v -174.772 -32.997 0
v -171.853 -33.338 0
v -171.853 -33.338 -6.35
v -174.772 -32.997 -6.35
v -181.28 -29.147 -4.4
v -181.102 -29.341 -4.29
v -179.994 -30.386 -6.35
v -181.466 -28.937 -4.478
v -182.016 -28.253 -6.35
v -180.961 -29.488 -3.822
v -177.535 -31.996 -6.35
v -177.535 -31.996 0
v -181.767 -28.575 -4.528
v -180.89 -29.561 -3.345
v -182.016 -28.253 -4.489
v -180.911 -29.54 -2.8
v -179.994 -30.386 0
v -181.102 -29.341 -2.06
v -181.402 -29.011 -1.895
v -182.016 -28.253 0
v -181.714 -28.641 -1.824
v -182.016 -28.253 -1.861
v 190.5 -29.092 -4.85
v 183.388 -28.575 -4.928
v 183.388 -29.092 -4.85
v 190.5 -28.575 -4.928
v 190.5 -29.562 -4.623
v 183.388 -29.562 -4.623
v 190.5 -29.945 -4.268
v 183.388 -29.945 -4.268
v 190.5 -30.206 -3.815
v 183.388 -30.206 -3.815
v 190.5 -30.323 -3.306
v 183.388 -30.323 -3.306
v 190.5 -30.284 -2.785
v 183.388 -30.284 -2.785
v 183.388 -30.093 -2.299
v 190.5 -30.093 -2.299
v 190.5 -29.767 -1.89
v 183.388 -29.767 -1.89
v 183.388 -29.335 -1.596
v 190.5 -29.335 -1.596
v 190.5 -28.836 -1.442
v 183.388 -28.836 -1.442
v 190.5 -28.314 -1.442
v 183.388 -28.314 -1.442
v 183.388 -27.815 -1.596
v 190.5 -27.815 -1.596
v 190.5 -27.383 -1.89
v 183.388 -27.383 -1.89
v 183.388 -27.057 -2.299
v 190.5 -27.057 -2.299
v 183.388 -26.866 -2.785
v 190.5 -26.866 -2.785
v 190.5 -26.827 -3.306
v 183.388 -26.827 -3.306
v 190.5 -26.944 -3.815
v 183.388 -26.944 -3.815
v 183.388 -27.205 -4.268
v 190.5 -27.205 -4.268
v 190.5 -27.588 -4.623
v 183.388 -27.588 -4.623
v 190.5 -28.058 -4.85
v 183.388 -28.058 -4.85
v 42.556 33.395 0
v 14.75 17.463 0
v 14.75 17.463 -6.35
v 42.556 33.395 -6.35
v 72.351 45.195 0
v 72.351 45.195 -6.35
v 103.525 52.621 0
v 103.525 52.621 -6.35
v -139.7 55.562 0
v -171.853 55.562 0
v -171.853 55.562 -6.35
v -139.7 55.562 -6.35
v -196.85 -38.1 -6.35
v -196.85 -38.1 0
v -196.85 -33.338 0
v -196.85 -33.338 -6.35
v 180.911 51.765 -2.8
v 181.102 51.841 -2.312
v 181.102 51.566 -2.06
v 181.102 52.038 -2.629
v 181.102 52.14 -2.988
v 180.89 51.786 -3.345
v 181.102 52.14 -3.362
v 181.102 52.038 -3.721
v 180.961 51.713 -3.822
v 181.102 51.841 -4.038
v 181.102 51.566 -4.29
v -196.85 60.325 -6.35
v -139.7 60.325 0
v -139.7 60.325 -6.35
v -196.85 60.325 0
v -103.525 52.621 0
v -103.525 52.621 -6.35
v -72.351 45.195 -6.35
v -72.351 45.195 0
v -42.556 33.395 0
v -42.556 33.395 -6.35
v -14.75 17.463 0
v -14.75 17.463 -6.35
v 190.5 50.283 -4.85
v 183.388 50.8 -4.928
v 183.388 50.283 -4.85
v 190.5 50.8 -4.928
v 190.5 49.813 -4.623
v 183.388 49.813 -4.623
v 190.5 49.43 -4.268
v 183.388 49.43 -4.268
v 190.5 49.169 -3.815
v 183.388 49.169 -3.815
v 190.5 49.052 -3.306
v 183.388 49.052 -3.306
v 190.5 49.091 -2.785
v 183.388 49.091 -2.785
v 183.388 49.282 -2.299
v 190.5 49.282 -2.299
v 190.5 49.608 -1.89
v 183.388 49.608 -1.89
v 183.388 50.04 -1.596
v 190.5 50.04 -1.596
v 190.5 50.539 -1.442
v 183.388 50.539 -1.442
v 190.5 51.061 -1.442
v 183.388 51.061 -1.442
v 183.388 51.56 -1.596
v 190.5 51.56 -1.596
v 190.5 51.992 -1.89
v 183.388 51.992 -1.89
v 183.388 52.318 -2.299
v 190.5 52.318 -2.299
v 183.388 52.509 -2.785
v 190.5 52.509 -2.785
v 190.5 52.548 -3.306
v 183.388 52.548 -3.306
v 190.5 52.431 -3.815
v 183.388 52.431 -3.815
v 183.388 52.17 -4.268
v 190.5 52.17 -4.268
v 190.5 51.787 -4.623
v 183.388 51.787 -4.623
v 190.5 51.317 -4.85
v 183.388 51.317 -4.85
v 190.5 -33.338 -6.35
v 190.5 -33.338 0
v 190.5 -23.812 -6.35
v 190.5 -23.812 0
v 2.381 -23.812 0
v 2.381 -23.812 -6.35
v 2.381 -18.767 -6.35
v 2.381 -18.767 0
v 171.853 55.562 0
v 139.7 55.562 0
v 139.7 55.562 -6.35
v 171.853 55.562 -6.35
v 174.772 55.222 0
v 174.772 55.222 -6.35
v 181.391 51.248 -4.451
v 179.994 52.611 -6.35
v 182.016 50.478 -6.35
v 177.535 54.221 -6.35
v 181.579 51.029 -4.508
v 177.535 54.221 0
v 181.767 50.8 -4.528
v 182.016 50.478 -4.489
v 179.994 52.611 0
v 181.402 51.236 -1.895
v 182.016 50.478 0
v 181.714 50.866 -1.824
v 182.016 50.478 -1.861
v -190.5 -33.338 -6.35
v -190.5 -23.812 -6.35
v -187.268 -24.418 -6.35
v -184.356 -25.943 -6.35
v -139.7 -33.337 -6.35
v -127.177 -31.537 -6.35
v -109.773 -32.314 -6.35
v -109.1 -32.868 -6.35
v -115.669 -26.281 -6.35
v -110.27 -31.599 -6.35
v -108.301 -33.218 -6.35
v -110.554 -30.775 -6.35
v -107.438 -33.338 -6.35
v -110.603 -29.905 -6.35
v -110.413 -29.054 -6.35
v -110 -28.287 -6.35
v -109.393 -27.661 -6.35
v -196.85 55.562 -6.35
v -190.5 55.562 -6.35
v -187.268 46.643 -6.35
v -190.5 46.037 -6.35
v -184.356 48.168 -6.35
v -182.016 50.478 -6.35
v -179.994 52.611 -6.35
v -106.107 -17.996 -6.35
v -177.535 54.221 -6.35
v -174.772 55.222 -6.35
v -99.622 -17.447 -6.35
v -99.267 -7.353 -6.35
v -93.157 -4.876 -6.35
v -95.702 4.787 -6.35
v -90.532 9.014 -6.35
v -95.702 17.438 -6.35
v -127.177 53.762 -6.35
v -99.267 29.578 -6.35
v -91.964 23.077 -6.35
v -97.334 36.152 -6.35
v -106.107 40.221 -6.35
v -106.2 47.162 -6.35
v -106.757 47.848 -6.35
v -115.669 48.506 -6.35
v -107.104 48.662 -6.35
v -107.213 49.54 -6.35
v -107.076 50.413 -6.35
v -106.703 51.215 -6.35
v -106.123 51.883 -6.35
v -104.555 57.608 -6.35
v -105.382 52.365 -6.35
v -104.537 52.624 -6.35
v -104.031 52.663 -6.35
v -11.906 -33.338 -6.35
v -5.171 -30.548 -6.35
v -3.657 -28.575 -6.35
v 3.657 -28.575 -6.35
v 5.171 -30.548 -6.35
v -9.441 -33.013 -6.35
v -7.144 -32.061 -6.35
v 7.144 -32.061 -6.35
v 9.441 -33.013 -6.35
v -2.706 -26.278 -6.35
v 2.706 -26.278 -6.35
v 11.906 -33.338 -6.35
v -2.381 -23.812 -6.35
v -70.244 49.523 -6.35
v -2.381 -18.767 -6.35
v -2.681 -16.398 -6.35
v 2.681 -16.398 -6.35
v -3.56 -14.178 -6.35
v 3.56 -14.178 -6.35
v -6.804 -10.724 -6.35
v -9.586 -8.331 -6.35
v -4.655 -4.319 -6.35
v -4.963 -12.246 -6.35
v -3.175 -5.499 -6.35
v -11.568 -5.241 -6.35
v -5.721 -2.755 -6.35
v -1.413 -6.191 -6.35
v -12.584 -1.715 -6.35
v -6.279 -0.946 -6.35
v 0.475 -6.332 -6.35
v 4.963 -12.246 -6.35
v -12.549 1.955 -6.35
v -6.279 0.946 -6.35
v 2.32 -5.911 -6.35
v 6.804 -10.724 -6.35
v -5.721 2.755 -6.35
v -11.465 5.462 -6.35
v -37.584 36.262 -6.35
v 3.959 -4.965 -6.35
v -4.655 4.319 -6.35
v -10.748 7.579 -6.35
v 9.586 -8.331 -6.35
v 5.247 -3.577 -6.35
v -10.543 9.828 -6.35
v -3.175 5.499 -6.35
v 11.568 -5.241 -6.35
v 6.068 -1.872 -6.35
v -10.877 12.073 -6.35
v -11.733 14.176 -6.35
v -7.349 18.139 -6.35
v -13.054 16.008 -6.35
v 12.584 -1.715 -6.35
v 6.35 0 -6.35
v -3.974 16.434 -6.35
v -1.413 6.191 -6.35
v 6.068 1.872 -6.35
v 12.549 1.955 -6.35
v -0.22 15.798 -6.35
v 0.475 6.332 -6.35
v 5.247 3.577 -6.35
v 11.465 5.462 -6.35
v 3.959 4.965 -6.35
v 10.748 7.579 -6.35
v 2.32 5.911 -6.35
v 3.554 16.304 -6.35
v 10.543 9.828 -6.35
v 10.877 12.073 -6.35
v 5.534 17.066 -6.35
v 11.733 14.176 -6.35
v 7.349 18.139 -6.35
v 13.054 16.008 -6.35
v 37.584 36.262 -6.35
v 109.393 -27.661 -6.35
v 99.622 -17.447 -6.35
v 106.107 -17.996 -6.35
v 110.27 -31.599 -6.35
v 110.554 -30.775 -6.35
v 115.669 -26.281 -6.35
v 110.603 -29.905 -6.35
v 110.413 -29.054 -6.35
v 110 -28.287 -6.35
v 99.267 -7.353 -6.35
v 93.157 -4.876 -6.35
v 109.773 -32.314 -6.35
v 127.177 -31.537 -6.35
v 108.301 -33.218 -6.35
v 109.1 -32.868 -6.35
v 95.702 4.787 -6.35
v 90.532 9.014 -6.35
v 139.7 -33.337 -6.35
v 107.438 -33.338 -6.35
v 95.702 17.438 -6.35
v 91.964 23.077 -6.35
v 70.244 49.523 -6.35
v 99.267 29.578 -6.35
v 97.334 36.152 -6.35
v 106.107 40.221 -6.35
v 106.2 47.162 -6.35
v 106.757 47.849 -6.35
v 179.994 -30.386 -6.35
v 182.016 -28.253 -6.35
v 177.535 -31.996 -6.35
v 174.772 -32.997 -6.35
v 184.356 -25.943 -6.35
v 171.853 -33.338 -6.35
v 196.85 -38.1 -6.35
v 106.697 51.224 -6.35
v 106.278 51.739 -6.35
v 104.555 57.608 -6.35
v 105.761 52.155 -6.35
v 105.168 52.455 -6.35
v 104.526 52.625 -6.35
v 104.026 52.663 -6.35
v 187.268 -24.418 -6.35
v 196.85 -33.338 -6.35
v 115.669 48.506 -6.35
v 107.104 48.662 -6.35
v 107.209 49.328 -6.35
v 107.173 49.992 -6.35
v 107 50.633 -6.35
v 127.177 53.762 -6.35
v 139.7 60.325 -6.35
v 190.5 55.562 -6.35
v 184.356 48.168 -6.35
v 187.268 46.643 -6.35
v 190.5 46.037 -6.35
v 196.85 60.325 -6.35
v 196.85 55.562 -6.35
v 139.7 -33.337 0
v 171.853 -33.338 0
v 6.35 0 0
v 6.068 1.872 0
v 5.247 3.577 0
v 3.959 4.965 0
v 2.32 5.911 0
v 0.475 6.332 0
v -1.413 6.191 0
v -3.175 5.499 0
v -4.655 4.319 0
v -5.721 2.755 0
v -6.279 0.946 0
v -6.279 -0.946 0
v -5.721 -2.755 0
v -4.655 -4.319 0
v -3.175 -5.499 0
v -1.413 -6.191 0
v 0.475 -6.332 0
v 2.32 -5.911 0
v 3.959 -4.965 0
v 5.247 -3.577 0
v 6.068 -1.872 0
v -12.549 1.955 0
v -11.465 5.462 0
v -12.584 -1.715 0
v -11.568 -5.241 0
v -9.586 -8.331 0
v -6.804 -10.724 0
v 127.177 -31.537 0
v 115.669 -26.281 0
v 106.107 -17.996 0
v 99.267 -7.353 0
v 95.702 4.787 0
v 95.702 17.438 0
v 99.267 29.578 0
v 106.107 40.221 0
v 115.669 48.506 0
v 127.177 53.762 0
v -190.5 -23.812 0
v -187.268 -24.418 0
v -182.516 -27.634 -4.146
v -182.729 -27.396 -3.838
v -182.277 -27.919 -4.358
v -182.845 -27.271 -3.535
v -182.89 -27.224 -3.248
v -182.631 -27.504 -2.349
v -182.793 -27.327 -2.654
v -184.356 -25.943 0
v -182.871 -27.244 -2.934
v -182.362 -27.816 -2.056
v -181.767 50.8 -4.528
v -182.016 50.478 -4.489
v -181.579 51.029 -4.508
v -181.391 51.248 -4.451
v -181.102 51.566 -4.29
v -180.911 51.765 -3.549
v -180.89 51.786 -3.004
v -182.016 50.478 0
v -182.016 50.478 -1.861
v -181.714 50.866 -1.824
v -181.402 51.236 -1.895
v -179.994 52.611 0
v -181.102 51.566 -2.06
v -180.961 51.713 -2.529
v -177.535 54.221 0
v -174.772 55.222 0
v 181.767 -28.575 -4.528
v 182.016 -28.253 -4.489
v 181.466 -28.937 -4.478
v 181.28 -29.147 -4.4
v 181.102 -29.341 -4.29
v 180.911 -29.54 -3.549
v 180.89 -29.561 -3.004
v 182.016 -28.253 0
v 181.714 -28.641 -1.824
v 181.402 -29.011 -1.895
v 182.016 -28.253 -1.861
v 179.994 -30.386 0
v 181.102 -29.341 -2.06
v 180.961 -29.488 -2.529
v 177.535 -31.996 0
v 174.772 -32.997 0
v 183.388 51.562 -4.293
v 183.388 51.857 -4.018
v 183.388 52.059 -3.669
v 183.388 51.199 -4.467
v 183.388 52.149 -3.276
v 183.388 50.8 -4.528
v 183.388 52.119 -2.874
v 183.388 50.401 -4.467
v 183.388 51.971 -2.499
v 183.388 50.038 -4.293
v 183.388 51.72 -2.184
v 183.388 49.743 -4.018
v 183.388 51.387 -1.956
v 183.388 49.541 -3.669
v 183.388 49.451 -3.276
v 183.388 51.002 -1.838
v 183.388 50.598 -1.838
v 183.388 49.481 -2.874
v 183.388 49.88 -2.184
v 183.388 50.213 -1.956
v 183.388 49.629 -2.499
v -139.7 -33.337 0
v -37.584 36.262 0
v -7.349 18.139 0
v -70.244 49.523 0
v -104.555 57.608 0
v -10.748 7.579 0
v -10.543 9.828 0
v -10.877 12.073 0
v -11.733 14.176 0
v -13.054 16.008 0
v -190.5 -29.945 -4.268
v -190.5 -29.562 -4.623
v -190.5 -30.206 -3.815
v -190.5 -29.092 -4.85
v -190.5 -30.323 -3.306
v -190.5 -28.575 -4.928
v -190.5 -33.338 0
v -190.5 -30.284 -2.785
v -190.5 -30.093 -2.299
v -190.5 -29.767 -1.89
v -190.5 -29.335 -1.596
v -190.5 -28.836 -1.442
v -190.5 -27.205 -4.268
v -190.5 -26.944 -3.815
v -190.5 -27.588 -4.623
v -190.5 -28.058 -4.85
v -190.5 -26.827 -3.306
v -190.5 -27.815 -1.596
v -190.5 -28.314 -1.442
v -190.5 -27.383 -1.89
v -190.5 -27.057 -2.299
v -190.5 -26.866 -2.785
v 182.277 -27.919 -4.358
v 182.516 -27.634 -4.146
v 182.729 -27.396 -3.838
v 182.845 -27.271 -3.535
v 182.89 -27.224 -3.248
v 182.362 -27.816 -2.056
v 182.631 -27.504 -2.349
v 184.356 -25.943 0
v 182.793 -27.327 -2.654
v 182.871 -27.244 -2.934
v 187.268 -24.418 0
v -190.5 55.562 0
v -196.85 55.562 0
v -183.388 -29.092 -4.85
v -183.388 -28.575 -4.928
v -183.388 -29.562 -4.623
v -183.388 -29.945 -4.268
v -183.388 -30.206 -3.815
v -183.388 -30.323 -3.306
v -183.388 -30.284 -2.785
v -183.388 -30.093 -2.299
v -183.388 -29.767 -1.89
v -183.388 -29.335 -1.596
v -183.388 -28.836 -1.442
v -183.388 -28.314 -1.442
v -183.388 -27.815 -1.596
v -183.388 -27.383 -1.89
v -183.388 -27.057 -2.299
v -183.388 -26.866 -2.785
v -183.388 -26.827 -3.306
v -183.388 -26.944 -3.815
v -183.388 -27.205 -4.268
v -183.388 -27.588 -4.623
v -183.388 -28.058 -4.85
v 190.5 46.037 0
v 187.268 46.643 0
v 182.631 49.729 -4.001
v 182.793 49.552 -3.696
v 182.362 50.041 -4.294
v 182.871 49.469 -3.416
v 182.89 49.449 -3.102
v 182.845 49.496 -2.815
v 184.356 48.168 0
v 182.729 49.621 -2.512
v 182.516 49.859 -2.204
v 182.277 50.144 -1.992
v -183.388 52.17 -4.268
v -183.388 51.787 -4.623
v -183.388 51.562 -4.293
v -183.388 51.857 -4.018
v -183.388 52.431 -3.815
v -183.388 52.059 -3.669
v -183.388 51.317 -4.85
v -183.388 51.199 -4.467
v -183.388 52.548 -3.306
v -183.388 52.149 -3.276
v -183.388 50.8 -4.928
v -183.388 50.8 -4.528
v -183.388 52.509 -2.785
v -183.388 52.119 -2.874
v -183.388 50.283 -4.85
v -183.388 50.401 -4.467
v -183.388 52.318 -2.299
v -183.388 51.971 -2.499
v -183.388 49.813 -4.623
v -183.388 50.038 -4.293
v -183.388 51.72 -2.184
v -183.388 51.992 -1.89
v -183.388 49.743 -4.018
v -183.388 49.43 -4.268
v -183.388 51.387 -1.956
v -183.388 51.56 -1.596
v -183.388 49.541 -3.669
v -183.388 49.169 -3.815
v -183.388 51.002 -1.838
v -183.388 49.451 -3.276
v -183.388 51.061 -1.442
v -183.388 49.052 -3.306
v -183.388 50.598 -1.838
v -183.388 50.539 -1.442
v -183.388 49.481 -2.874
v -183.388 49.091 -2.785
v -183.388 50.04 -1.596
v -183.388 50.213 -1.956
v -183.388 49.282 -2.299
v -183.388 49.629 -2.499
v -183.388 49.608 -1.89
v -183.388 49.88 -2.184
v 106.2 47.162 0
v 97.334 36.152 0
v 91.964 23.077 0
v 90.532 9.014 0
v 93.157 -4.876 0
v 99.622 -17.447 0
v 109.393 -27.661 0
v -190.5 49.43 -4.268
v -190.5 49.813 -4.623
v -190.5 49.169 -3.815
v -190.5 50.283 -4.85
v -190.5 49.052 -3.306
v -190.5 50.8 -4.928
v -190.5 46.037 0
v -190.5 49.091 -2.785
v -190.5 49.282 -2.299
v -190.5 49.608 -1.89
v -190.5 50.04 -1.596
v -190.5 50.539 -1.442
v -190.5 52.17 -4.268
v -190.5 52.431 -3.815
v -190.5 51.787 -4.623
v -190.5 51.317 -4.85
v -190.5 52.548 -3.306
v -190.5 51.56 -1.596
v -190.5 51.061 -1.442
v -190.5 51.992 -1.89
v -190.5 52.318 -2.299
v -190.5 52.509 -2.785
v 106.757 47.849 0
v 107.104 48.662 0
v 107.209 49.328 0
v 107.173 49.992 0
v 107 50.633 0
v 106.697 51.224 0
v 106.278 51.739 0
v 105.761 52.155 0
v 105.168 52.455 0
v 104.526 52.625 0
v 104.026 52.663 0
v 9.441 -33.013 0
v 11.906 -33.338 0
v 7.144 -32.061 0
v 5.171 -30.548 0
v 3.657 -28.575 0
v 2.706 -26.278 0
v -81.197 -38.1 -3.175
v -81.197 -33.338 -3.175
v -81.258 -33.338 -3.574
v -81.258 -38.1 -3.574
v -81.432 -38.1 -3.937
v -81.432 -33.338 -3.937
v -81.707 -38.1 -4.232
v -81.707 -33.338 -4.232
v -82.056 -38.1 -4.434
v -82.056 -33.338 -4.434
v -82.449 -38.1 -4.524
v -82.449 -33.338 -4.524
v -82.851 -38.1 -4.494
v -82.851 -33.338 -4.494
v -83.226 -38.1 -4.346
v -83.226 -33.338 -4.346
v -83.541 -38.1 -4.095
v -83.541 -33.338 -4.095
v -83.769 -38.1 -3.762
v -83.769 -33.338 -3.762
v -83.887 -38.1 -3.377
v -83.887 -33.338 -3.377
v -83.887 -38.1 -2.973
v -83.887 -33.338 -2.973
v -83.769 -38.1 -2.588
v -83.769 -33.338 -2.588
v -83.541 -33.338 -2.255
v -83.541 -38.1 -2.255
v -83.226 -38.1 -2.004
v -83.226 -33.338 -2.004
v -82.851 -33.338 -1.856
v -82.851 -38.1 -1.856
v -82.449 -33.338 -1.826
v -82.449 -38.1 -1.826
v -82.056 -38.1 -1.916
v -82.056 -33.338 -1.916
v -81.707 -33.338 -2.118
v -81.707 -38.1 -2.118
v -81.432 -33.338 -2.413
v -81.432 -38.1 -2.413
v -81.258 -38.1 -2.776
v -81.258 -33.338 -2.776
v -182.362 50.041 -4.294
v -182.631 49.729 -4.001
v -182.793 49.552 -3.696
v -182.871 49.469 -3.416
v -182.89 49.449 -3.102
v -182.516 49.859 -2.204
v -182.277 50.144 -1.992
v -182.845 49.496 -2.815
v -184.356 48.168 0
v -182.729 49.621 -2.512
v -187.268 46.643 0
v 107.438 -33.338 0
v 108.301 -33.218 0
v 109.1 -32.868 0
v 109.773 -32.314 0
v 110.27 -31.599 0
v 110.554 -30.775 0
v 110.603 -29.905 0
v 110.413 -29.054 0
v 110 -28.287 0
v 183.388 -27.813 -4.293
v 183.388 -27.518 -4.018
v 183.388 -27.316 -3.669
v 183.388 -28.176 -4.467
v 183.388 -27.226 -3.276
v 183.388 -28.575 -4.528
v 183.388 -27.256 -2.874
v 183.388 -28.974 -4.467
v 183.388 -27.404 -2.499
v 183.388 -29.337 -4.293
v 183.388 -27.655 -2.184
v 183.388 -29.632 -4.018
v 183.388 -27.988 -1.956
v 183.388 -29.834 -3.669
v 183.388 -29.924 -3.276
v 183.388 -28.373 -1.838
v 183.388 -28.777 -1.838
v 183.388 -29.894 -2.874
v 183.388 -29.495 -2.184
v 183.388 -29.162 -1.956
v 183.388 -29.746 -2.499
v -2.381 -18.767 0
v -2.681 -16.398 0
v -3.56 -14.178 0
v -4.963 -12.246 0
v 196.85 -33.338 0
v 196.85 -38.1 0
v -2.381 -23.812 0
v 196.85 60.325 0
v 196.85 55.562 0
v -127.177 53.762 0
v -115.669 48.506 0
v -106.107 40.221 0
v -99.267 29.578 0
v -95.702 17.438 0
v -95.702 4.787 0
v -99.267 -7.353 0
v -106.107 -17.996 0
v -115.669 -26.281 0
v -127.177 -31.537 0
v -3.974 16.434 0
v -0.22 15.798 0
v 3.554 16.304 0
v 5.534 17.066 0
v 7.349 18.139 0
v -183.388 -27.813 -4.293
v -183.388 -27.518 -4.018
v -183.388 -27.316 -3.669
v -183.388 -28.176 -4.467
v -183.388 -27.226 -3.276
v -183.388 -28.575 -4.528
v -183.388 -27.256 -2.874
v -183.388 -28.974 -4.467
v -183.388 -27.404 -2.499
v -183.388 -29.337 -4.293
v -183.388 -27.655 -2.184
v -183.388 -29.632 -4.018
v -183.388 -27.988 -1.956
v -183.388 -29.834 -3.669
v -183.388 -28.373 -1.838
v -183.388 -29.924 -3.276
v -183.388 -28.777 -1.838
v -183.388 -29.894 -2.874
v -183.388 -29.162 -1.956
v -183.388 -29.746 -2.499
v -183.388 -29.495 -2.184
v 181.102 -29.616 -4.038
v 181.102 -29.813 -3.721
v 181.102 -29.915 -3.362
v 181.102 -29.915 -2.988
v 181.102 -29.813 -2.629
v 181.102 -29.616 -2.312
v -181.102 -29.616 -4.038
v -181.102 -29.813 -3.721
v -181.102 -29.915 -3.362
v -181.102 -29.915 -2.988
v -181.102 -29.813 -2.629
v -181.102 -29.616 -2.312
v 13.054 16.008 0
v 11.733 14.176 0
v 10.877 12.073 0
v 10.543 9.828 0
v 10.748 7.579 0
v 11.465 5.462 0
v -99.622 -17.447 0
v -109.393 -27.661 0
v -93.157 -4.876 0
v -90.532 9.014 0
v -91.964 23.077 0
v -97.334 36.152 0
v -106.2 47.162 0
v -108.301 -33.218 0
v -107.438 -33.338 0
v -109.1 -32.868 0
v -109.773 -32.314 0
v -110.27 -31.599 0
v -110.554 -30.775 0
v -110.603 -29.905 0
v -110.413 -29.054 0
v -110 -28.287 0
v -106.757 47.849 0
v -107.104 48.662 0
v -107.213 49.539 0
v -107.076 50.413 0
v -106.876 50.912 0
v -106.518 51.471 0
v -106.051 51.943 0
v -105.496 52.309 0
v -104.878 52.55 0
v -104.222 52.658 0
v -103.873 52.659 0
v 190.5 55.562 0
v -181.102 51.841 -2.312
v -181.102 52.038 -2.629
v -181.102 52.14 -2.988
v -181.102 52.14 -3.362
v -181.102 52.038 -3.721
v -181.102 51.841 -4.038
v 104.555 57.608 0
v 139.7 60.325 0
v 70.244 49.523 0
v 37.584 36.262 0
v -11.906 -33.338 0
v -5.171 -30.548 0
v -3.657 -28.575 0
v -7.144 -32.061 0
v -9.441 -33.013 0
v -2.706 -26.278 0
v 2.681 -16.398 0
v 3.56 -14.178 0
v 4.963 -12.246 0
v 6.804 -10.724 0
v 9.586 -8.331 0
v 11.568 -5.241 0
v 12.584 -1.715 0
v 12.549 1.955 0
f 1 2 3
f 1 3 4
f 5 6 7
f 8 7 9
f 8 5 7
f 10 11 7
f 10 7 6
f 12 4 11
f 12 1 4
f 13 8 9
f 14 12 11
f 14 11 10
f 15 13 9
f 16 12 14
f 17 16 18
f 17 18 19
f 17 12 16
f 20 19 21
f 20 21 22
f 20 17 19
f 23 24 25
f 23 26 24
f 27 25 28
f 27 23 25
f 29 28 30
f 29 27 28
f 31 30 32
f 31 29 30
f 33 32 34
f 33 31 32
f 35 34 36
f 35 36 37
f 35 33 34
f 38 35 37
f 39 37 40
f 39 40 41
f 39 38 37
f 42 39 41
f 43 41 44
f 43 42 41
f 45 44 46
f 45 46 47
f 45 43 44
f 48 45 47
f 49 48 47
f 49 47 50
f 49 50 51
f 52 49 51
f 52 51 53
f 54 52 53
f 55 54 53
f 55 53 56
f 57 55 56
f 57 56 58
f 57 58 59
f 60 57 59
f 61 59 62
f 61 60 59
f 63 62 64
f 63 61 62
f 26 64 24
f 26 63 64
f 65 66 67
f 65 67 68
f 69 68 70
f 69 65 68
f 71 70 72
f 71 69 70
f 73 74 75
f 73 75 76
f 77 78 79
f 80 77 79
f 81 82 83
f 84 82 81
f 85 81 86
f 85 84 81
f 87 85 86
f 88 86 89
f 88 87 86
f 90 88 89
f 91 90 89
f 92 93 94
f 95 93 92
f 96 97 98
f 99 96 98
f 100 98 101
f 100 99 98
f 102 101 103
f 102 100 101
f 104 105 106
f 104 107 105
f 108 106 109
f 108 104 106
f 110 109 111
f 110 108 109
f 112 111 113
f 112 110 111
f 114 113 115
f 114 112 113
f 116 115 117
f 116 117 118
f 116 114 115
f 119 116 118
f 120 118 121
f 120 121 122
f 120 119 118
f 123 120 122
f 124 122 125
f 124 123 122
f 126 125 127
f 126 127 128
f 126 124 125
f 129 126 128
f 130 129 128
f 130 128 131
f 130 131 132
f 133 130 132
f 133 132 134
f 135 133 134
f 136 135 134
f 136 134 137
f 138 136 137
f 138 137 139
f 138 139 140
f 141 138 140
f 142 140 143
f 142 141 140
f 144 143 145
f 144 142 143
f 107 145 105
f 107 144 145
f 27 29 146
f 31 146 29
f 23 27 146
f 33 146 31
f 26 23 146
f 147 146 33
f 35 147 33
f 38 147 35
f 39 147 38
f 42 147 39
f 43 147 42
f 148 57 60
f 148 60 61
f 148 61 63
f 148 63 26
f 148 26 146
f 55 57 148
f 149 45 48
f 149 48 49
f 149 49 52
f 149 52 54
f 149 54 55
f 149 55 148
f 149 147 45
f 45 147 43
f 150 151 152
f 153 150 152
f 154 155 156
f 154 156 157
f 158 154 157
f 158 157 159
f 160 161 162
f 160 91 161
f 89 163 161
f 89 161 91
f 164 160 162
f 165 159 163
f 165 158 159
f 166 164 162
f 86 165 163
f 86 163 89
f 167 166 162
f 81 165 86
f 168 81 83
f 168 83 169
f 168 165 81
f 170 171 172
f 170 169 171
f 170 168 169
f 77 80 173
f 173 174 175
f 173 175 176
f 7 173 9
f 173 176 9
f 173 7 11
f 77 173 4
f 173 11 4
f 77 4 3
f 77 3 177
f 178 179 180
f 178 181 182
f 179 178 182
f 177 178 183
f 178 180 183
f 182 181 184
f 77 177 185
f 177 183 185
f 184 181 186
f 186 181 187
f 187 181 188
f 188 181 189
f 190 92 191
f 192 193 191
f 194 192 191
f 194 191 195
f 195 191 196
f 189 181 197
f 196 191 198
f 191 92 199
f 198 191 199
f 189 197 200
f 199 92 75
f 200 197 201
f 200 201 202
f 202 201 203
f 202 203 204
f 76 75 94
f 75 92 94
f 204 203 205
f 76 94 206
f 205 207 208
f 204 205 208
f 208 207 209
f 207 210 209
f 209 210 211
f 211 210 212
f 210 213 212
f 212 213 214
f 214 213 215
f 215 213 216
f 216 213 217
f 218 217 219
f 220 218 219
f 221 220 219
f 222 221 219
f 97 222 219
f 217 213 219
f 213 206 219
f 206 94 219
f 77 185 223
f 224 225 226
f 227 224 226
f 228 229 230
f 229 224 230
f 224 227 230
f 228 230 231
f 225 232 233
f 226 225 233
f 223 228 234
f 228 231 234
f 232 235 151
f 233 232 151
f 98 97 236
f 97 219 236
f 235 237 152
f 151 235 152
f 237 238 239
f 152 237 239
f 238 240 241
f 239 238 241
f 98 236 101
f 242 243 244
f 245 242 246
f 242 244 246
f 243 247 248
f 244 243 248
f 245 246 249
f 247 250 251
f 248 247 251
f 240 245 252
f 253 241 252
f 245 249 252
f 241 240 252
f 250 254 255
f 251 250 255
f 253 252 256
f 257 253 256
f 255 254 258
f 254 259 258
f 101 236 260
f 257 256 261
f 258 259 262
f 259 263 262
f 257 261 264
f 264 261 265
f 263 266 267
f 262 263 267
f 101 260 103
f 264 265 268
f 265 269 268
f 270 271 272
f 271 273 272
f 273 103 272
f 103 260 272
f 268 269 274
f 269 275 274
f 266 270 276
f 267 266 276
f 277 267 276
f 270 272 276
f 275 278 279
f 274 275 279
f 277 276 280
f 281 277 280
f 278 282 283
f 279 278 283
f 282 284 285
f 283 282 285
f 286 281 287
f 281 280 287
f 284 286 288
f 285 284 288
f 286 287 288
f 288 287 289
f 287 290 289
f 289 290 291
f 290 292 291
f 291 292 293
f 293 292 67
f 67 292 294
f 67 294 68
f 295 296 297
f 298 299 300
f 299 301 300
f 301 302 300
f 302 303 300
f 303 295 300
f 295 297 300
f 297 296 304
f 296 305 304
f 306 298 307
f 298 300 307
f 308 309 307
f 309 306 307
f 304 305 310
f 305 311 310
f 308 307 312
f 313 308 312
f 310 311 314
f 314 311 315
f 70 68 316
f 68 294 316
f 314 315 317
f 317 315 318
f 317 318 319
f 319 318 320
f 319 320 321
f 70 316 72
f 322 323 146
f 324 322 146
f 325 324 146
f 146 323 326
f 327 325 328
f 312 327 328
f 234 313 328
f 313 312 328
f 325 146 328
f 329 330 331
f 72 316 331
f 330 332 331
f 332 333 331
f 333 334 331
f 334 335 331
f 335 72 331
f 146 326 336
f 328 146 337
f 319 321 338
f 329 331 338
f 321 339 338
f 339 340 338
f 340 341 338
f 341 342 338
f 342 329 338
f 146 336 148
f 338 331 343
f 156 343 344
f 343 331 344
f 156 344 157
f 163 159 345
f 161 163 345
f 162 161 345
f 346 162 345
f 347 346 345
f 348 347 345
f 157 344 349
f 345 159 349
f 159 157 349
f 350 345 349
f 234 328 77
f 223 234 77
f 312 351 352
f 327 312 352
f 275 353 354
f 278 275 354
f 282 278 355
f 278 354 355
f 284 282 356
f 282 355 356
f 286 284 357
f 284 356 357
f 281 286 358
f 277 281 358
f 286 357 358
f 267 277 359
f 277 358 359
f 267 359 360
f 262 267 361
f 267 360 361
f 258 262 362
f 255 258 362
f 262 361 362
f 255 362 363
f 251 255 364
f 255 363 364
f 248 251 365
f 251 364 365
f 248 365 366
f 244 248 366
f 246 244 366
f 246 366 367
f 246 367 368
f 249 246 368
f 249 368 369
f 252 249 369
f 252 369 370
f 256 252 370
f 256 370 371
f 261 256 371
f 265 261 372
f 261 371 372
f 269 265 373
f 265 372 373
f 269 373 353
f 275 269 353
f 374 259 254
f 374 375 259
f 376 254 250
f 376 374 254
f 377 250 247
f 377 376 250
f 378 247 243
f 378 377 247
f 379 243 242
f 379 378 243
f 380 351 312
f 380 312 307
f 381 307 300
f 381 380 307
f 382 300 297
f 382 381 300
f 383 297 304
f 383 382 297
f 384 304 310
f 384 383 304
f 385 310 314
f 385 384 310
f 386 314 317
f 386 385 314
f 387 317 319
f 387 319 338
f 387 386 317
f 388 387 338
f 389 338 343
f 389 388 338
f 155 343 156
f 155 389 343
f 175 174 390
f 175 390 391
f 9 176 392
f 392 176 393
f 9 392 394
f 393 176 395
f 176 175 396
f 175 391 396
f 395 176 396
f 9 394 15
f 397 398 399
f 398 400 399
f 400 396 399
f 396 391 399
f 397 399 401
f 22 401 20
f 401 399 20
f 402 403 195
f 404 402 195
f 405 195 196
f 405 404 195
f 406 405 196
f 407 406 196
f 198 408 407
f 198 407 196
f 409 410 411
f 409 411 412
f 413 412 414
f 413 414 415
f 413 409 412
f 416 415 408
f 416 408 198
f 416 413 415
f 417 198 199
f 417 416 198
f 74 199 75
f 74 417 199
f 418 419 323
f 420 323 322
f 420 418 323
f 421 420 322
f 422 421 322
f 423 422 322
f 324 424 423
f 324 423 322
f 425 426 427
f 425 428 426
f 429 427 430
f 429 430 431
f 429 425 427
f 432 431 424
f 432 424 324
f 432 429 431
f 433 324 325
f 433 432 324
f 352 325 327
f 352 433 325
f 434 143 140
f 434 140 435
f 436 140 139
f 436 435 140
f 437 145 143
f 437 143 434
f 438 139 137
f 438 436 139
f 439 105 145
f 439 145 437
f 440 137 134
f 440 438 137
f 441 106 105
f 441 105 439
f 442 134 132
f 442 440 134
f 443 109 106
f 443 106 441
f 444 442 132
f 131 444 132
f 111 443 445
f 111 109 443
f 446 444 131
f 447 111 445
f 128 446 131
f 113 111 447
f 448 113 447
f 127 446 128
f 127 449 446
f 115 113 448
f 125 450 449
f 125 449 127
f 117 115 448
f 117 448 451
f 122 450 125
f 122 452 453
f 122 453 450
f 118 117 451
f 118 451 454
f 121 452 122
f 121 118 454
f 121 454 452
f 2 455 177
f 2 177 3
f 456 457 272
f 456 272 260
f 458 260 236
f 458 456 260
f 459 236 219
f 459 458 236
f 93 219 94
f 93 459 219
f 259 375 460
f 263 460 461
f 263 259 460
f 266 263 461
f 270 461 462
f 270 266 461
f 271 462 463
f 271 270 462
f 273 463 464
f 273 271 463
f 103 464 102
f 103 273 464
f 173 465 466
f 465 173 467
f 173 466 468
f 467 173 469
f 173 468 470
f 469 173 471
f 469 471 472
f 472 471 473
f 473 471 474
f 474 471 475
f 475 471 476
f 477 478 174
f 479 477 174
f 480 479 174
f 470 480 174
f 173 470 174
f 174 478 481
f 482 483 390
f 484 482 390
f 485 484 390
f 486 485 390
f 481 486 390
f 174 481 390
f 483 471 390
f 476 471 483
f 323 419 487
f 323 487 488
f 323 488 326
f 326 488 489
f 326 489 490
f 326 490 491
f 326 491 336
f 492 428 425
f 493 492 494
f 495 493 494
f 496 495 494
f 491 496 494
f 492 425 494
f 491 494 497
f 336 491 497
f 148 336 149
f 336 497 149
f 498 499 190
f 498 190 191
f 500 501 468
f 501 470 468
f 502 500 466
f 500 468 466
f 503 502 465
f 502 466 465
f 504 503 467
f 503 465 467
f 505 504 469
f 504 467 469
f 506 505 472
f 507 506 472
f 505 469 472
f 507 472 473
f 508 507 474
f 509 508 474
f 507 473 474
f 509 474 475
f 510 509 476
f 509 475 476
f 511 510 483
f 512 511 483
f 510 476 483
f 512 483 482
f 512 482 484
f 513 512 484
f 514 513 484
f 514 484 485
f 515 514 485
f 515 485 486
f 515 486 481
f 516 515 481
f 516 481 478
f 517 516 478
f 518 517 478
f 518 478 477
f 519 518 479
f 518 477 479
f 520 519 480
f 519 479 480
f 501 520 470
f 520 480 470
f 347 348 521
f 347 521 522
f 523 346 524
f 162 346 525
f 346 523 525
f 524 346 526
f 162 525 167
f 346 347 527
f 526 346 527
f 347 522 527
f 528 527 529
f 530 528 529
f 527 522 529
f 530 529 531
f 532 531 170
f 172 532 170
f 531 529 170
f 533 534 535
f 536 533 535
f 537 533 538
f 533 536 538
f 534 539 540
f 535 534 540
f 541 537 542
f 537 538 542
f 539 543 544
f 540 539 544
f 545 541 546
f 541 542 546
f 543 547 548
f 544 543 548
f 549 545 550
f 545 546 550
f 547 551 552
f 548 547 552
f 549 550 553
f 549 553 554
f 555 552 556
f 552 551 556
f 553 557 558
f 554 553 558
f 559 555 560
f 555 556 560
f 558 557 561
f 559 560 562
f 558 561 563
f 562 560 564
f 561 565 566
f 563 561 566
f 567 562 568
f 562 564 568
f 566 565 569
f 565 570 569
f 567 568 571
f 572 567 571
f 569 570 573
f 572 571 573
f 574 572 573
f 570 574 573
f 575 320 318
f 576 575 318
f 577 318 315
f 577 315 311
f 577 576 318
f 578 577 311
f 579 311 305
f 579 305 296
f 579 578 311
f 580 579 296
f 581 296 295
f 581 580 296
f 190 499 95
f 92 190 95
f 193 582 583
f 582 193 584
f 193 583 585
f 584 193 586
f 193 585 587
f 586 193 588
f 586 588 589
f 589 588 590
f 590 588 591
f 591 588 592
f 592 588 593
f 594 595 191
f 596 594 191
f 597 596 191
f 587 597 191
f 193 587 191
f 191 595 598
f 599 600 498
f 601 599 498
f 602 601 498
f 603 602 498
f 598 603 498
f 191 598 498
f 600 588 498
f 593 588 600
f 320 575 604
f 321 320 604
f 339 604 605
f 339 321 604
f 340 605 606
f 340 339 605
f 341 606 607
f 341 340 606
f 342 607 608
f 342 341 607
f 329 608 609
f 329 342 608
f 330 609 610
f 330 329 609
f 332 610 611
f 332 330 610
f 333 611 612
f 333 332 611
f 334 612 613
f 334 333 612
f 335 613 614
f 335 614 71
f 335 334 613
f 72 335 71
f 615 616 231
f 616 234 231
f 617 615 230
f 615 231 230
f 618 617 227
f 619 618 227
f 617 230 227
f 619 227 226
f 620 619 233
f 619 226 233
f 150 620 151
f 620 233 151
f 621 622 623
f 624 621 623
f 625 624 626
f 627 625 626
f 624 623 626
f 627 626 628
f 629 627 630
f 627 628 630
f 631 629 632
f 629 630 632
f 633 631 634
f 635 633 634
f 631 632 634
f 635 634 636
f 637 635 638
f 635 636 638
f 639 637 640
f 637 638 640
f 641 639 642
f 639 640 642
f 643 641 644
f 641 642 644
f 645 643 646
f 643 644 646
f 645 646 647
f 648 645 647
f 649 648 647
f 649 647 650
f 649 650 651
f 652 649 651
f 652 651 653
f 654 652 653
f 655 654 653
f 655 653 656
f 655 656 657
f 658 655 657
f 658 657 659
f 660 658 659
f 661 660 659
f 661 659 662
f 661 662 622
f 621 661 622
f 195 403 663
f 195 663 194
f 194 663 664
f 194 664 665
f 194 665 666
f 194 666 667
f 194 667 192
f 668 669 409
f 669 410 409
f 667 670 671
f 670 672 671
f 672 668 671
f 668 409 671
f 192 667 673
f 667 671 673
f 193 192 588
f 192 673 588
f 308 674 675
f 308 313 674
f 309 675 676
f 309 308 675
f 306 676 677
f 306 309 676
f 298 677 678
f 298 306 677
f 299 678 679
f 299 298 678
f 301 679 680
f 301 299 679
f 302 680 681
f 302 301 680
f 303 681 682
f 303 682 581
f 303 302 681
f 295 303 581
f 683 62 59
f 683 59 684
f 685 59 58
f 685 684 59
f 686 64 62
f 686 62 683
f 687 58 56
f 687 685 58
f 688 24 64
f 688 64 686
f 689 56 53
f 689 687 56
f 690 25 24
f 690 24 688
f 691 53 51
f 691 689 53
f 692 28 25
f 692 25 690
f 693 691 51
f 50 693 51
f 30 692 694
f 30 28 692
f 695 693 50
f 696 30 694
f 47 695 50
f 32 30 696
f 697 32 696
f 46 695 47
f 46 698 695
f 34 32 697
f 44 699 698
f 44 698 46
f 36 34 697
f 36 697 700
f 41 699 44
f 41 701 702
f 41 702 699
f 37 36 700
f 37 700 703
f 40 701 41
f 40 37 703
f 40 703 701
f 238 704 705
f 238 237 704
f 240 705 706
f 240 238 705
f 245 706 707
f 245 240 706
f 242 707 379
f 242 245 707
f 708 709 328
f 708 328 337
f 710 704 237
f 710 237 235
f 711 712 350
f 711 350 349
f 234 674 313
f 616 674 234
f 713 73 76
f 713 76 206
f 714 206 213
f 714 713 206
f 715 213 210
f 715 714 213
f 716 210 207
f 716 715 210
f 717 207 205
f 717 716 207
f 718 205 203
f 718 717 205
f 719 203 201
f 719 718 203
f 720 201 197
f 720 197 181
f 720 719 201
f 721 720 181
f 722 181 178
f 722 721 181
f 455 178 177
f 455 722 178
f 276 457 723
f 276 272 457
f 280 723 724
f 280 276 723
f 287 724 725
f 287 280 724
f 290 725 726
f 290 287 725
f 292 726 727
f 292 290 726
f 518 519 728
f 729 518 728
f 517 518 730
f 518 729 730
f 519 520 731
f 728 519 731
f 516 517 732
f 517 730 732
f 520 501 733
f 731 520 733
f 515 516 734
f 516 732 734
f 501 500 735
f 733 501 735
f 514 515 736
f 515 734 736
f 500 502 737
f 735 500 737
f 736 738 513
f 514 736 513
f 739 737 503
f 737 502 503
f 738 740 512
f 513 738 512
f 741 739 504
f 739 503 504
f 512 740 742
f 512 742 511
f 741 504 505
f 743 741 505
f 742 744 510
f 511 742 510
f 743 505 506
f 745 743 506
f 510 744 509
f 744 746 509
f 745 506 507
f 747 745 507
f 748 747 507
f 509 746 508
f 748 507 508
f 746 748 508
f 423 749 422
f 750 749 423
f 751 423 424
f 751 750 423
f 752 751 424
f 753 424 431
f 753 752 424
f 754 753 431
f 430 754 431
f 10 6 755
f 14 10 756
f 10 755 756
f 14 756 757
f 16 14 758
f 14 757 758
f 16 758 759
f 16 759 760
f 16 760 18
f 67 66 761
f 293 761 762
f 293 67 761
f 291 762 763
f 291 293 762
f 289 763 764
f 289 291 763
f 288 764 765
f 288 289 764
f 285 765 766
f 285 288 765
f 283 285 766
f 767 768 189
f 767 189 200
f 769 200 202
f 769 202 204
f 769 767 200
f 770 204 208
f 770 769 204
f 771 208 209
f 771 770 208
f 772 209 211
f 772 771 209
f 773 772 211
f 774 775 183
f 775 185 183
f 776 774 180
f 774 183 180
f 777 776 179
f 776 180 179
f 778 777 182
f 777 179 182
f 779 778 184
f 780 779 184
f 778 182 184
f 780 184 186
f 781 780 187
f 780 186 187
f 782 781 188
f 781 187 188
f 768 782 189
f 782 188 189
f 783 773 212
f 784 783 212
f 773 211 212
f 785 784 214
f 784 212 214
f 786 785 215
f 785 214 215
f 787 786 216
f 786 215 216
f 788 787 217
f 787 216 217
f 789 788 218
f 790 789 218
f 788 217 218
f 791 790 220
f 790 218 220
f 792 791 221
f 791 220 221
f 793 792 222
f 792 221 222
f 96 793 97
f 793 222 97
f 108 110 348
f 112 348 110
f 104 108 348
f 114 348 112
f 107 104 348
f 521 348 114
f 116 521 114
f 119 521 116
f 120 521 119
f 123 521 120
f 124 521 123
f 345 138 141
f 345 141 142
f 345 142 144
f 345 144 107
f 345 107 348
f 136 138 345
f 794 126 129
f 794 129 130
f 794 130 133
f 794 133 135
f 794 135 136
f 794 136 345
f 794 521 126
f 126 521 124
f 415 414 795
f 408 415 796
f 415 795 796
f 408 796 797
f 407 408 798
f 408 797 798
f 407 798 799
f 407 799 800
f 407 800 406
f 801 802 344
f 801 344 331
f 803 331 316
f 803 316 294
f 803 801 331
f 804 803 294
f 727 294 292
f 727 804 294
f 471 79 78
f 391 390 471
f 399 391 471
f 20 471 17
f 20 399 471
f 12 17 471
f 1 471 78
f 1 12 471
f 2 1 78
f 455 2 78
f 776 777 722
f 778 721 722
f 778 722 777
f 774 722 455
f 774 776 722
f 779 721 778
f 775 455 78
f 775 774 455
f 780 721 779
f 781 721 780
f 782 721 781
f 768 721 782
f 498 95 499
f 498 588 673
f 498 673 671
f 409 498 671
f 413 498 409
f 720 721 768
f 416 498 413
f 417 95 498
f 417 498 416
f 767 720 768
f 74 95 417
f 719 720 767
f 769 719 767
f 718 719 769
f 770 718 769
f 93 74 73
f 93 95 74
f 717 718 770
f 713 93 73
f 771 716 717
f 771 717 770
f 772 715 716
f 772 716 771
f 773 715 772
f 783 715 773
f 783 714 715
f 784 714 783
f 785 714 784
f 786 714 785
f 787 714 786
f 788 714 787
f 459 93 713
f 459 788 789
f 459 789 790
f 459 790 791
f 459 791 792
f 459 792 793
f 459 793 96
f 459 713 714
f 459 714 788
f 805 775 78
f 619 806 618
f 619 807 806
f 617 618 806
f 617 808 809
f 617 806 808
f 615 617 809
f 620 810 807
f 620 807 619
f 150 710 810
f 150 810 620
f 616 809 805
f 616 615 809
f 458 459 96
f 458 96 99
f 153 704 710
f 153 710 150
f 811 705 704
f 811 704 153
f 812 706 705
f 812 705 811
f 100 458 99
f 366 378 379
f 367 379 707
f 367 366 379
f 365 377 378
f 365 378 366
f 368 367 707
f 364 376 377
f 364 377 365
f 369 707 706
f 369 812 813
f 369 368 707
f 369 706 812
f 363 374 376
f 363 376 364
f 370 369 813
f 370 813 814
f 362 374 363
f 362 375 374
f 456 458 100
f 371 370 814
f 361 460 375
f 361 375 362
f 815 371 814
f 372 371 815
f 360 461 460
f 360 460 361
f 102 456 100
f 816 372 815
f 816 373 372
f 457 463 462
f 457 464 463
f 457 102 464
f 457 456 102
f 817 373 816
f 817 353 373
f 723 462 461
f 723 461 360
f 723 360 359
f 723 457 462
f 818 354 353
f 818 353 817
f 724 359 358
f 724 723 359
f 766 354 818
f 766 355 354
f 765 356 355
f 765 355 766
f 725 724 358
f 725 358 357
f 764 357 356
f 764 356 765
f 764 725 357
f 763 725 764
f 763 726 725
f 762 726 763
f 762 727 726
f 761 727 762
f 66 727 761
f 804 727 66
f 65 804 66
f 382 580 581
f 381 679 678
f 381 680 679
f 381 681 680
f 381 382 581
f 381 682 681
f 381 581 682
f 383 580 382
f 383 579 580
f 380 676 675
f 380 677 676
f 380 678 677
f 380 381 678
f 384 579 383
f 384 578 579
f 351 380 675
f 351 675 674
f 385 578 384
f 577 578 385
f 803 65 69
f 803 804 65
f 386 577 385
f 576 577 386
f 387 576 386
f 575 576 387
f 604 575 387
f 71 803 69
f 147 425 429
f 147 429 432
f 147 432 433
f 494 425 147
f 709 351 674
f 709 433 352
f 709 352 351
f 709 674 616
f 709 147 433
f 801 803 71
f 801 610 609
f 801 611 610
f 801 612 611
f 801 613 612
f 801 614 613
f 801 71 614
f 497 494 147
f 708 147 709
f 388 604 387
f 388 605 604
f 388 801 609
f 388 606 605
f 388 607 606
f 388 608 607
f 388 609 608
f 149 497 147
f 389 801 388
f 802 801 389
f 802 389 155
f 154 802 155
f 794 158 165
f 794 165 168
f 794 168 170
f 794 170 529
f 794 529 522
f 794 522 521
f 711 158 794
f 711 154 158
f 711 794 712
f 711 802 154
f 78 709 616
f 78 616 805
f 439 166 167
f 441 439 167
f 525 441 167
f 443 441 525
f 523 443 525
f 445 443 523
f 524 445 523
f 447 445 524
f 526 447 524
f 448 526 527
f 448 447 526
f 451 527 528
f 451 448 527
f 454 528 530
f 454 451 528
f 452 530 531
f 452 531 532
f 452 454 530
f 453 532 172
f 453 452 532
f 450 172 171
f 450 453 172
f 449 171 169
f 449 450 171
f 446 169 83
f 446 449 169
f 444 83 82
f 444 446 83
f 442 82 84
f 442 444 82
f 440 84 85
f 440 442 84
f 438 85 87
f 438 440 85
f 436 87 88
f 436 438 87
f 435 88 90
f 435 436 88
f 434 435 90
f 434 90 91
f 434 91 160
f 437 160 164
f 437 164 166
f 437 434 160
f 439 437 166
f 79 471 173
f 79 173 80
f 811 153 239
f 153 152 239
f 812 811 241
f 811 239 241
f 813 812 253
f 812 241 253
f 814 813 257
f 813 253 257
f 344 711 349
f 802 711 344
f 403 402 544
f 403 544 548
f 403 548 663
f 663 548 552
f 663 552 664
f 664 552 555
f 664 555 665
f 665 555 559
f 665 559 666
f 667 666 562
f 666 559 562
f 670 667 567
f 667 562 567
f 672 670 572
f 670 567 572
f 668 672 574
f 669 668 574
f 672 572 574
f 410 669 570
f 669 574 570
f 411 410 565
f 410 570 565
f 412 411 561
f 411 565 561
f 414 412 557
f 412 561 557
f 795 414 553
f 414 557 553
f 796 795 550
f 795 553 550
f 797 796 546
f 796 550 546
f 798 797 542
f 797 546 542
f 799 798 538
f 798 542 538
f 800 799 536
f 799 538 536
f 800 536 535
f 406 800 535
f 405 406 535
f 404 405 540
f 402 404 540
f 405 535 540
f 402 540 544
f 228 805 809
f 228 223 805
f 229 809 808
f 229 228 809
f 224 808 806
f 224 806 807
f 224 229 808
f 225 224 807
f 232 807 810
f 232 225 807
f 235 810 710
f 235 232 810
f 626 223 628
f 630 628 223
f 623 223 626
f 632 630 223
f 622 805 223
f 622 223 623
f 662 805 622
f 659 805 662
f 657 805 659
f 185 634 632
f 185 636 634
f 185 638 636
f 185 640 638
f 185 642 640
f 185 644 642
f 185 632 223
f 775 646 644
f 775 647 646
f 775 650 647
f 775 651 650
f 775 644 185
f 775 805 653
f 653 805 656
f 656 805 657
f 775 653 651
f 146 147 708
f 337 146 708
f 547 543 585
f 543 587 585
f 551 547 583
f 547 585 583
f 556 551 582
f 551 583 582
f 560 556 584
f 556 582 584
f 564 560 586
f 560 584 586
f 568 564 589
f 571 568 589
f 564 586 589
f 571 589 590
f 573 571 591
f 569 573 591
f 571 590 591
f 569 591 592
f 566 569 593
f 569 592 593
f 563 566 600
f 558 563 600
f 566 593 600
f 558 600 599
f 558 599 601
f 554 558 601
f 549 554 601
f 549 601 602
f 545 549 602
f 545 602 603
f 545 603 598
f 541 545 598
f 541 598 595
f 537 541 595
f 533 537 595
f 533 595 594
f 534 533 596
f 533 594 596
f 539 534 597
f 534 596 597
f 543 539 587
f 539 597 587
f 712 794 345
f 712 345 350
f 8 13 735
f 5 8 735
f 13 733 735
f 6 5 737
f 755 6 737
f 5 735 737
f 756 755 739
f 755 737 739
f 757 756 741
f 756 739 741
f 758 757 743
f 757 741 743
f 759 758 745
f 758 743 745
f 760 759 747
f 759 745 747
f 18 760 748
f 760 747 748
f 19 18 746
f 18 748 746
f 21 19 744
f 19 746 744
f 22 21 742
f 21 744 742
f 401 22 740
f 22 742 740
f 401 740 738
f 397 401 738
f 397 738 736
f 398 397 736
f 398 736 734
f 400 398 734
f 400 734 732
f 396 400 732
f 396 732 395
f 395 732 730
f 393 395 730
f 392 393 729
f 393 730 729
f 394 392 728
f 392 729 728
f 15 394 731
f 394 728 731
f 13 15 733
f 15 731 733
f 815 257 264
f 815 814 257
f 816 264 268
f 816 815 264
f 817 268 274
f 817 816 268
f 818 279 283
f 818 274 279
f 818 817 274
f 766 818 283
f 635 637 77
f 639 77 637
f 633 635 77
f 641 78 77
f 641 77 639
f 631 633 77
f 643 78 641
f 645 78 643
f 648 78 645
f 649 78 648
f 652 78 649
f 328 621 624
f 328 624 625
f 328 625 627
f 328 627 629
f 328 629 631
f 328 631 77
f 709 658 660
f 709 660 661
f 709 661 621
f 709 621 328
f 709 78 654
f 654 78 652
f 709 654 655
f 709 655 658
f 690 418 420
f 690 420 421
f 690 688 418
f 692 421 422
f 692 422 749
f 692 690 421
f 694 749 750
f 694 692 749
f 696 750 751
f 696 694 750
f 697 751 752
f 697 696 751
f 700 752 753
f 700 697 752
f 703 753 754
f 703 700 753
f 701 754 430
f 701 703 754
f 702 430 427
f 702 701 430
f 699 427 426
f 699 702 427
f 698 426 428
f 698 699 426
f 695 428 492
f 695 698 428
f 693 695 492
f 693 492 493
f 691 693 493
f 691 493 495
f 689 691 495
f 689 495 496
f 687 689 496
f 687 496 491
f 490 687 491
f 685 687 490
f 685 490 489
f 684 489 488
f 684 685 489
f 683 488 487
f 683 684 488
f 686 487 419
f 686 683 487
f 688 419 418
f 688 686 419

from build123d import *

# Parameters (mm, degrees)
SKETCH1_W                      = 6.35
SKETCH1_H                      = 4.7625
SKETCH1_R                      = 12.7
SKETCH1_R_2                    = 6.35
BOSS_EXTRUDE1_DEPTH            = 6.35
SKETCH2_W                      = 6.35
SKETCH2_H                      = 9.525
BOSS_EXTRUDE2_DEPTH            = 6.35
FILLET1_R                      = 12.7
FILLET2_R                      = 11.1125
F_6_32_TAPPED_HOLE1_D          = 2.7051
F_6_32_TAPPED_HOLE1_DEPTH      = 9.398
F_6_32_TAPPED_HOLE1_TIP        = 0.81269403
FILLET3_R                      = 9.525
FILLET4_R                      = 12.7
F_6_32_TAPPED_HOLE2_AT_2_COUNT = 2
F_6_32_TAPPED_HOLE2_AT_2_PITCH = 79.375
FILLET5_R                      = 3.175


with BuildPart() as part:
    # Sketch1 → Boss-Extrude1 (new body)
    # profile 1 of 11: a face of its own
    with BuildSketch(Plane.XY):
        with Locations((-193.675, -35.71875)):
            Rectangle(SKETCH1_W, SKETCH1_H)
    # profile 2 of 11: a face of its own
    with BuildSketch(Plane.XY):
        with Locations((-193.675, 57.94375)):
            Rectangle(SKETCH1_W, SKETCH1_H)
    # profile 3 of 11: a face of its own
    with BuildSketch(Plane.XY):
        with BuildLine():
            Line((-190.5, 55.5625), (-139.7, 55.5625))
            ThreePointArc((-139.7, 55.5625), (-127.904529217, 55.251640636), (-116.141805402, 54.31992556))
            ThreePointArc((-116.141805402, 54.31992556), (-58.142540048, 40.183298939), (-5.938839164, 11.225871431))
            ThreePointArc((-5.938839164, 11.225871431), (-3.059528789, 12.325959743), (0, 12.7))
            ThreePointArc((0, 12.7), (-65.90259045, 48.091568013), (-139.7, 60.325))
            Line((-139.7, 60.325), (-190.5, 60.325))
            Line((-190.5, 60.325), (-190.5, 55.5625))
        make_face()
    # profile 4 of 11: a face of its own
    with BuildSketch(Plane.XY):
        with BuildLine():
            ThreePointArc((-139.7, 55.5625), (-95.25, 11.1125), (-139.7, -33.3375))
            Line((-139.7, -33.3375), (-118.579686171, -33.3375))
            ThreePointArc((-118.579686171, -33.3375), (-90.506521339, 9.744357657), (-116.141805402, 54.31992556))
            ThreePointArc((-116.141805402, 54.31992556), (-127.904529217, 55.251640636), (-139.7, 55.5625))
        make_face()
    # profile 5 of 11: a face of its own
    with BuildSketch(Plane.XY):
        Polygon((190.5, -38.1), (190.5, -33.3375), (-118.579686171, -33.3375), (-190.5, -33.3375), (-190.5, -38.1), align=None)
    # profile 6 of 11: a face of its own
    with BuildSketch(Plane.XY):
        Circle(SKETCH1_R)
        Circle(SKETCH1_R_2, mode=Mode.SUBTRACT)
    # profile 7 of 11: a face of its own
    with BuildSketch(Plane.XY):
        with BuildLine():
            Line((-2.38125, -33.3375), (2.38125, -33.3375))
            Line((2.38125, -33.3375), (2.38125, -12.474760456))
            ThreePointArc((2.38125, -12.474760456), (0, -12.7), (-2.38125, -12.474760456))
            Line((-2.38125, -12.474760456), (-2.38125, -33.3375))
        make_face()
    # profile 8 of 11: a face of its own
    with BuildSketch(Plane.XY):
        with BuildLine():
            ThreePointArc((116.141805402, 54.31992556), (127.904529217, 55.251640636), (139.7, 55.5625))
            Line((139.7, 55.5625), (190.5, 55.5625))
            Line((190.5, 55.5625), (190.5, 60.325))
            Line((190.5, 60.325), (139.7, 60.325))
            ThreePointArc((139.7, 60.325), (65.90259045, 48.091568013), (0, 12.7))
            ThreePointArc((0, 12.7), (3.059528789, 12.325959743), (5.938839164, 11.225871431))
            ThreePointArc((5.938839164, 11.225871431), (58.142540048, 40.183298939), (116.141805402, 54.31992556))
        make_face()
    # profile 9 of 11: a face of its own
    with BuildSketch(Plane.XY):
        with BuildLine():
            Line((118.579686171, -33.3375), (139.7, -33.3375))
            ThreePointArc((139.7, -33.3375), (95.25, 11.1125), (139.7, 55.5625))
            ThreePointArc((139.7, 55.5625), (127.904529217, 55.251640636), (116.141805402, 54.31992556))
            ThreePointArc((116.141805402, 54.31992556), (90.506521339, 9.744357657), (118.579686171, -33.3375))
        make_face()
    # profile 10 of 11: a face of its own
    with BuildSketch(Plane.XY):
        with Locations((193.675, 57.94375)):
            Rectangle(SKETCH1_W, SKETCH1_H)
    # profile 11 of 11: a face of its own
    with BuildSketch(Plane.XY):
        with Locations((193.675, -35.71875)):
            Rectangle(SKETCH1_W, SKETCH1_H)
    extrude(amount=-BOSS_EXTRUDE1_DEPTH)

    # Sketch2 → Boss-Extrude2 (add)
    with BuildSketch(Plane.XY):
        with Locations((-187.325, -28.575)):
            Rectangle(SKETCH2_W, SKETCH2_H)
        with Locations((-187.325, 50.8)):
            Rectangle(SKETCH2_W, SKETCH2_H)
        with Locations((187.325, 50.8)):
            Rectangle(SKETCH2_W, SKETCH2_H)
        with Locations((187.325, -28.575)):
            Rectangle(SKETCH2_W, SKETCH2_H)
    extrude(amount=-BOSS_EXTRUDE2_DEPTH)

    # Fillet1
    # the kernel refuses this fillet: 12.7 mm, written as the material it adds along each edge
    with BuildSketch(Plane(origin=(184.15, -33.3375, 0), x_dir=(-1, 0, 0), z_dir=(0, 0, -1)), Plane(origin=(-184.15, 55.5625, 0), x_dir=(1, 0, 0), z_dir=(0, 0, -1))) as fillet1_piece_1:
        with BuildLine():
            CenterArc((12.296722124, 12.7), FILLET1_R, 194.477512186, 75.522487814)
            Line((0, 9.525), (-0.245934442, 9.4615))
            ThreePointArc((-0.245934442, 9.4615), (-0.254, 4.7625), (-0.254, 0))
            Line((-0.254, 0), (0, -0.254))
            Line((0, -0.254), (12.296722124, -0.254))
            Line((12.296722124, -0.254), (12.296722124, 0))
        make_face()
    extrude(amount=6.35)
    with BuildSketch(Plane(origin=(184.15, 55.5625, 0), x_dir=(-1, 0, 0), z_dir=(0, 0, -1)), Plane(origin=(-184.15, -33.3375, 0), x_dir=(1, 0, 0), z_dir=(0, 0, -1))) as fillet1_piece_2:
        with BuildLine():
            CenterArc((12.296722124, -12.7), FILLET1_R, 90, 75.522487814)
            Line((0, -9.525), (-0.245934442, -9.4615))
            ThreePointArc((-0.245934442, -9.4615), (-0.254, -4.7625), (-0.254, 0))
            Line((-0.254, 0), (0, 0.254))
            Line((0, 0.254), (12.296722124, 0.254))
            Line((12.296722124, 0.254), (12.296722124, 0))
        make_face()
    extrude(amount=6.35)

    # Fillet2
    # the kernel refuses this fillet: 11.1125 mm, written as the material it takes off along each edge
    with BuildSketch(Plane(origin=(184.15, -23.8125, 15.875), x_dir=(1, 0, 0), z_dir=(0, 0, -1))) as fillet2_piece_1:
        with BuildLine():
            CenterArc((6.758920293, 11.10497368), FILLET2_R, 216.847264444, 51.043876357)
            Line((-2.133712835, 4.440985963), (-2.311565498, 4.307706209))
            ThreePointArc((-2.311565498, 4.307706209), (-1.049758647, 2.228707764), (-0.215192637, -0.0555625))
            Line((-0.215192637, -0.0555625), (0, -0.22225))
            ThreePointArc((0, -0.22225), (3.175, -0.22225), (6.341821594, -0.222099474))
            Line((6.341821594, -0.222099474), (6.35, 0))
        make_face()
    extrude(amount=38.1, mode=Mode.SUBTRACT)
    with BuildSketch(Plane(origin=(184.15, 46.0375, 15.875), x_dir=(-0.43306748122172517, 0.9013615016785834, 0), z_dir=(0, 0, -1))) as fillet2_piece_2:
        with BuildLine():
            CenterArc((7.082527166, 10.901433526), FILLET2_R, 207.771247513, 51.043876357)
            Line((-2.749978506, 5.723645536), (-2.946628619, 5.620089776))
            ThreePointArc((-2.946628619, 5.620089776), (-1.575316847, 2.76557352), (-0.200327594, -0.096249248))
            Line((-0.200327594, -0.096249248), (0.043111035, -0.218028671))
            ThreePointArc((0.043111035, -0.218028671), (2.46348771, 0.018968828), (4.883864385, -0.218028671))
            Line((4.883864385, -0.218028671), (4.92697542, 0))
        make_face()
    extrude(amount=38.1, mode=Mode.SUBTRACT)
    with BuildSketch(Plane(origin=(-184.15, -23.8125, 15.875), x_dir=(-1, 0, 0), z_dir=(0, 0, -1))) as fillet2_piece_3:
        with BuildLine():
            CenterArc((6.758920293, -11.10497368), FILLET2_R, 92.108859198, 51.043876357)
            Line((-2.133712835, -4.440985963), (-2.311565498, -4.307706209))
            ThreePointArc((-2.311565498, -4.307706209), (-1.049758647, -2.228707764), (-0.215192637, 0.0555625))
            Line((-0.215192637, 0.0555625), (0, 0.22225))
            ThreePointArc((0, 0.22225), (3.175, 0.22225), (6.341821594, 0.222099474))
            Line((6.341821594, 0.222099474), (6.35, 0))
        make_face()
    extrude(amount=38.1, mode=Mode.SUBTRACT)
    with BuildSketch(Plane(origin=(-184.15, 46.0375, 15.875), x_dir=(0.43306748122172517, 0.9013615016785834, 0), z_dir=(0, 0, -1))) as fillet2_piece_4:
        with BuildLine():
            CenterArc((7.082527166, -10.901433526), FILLET2_R, 101.184876129, 51.043876357)
            Line((-2.749978506, -5.723645536), (-2.946628619, -5.620089776))
            ThreePointArc((-2.946628619, -5.620089776), (-1.575316847, -2.76557352), (-0.200327594, 0.096249248))
            Line((-0.200327594, 0.096249248), (0.043111035, 0.218028671))
            ThreePointArc((0.043111035, 0.218028671), (2.46348771, -0.018968828), (4.883864385, 0.218028671))
            Line((4.883864385, 0.218028671), (4.92697542, 0))
        make_face()
    extrude(amount=38.1, mode=Mode.SUBTRACT)

    # #6-32 Tapped Hole1
    with Locations(Plane(origin=(0, -38.1, 0), x_dir=(-1, 0, 0), z_dir=(0, -1, 0))):
        with Locations((82.55, 3.175)):
            Hole(F_6_32_TAPPED_HOLE1_D / 2, depth=F_6_32_TAPPED_HOLE1_DEPTH)
            with Locations((0, 0, -(F_6_32_TAPPED_HOLE1_DEPTH + F_6_32_TAPPED_HOLE1_TIP / 2))):  # 118° drill point
                Cone(0, F_6_32_TAPPED_HOLE1_D / 2, F_6_32_TAPPED_HOLE1_TIP, mode=Mode.SUBTRACT)

    # Fillet3
    fillet3_edges = [part.edges().sort_by_distance(p)[0] for p in [
        (2.38125, -12.474760456, -3.175),
        (2.38125, -33.3375, -3.175),
        (5.938839164, 11.225871431, -3.175),
        (-2.38125, -33.3375, -3.175),
        (-2.38125, -12.474760456, -3.175),
        (-5.938839164, 11.225871431, -3.175),
    ]]
    fillet(fillet3_edges, radius=FILLET3_R)

    # Fillet4
    fillet4_edges = [part.edges().sort_by_distance(p)[0] for p in [
        (0, 12.7, -3.175),
    ]]
    fillet(fillet4_edges, radius=FILLET4_R)

    # Sketch12 → #6-32 Tapped Hole2 (revolve, cut)
    with BuildSketch(Plane(origin=(190.5, -28.575, -3.175), x_dir=(0, 0, -1), z_dir=(0, 1, 0))):
        Polygon((0, 0), (0, 10.21069403), (1.35255, 9.398), (1.35255, 7.112), (1.7526, 7.112), (1.7526, 0), align=None)
    f_6_32_tapped_hole2 = revolve(axis=Axis((196.85, -28.575, -3.175), (-1, 0, 0)), mode=Mode.SUBTRACT)

    # #6-32 Tapped Hole2 at 2: #6-32 Tapped Hole2 ×2
    with Locations(*[(0, i * F_6_32_TAPPED_HOLE2_AT_2_PITCH, 0) for i in range(1, F_6_32_TAPPED_HOLE2_AT_2_COUNT)]):
        add(f_6_32_tapped_hole2, mode=Mode.SUBTRACT)

    # Mirror1: #6-32 Tapped Hole2 across plane
    add(f_6_32_tapped_hole2.mirror(Plane(origin=(0, 0, 0), x_dir=(0, 0, 1), z_dir=(1, 0, 0))), mode=Mode.SUBTRACT)

    # Mirror1 copy 1 sketch → Mirror1 copy 1 (revolve, cut)
    with BuildSketch(Plane(origin=(-190.5, 50.8, -3.175), x_dir=(0, 0, -1), z_dir=(0, 1, 0))):
        Polygon((0, 0), (0, -10.21069403), (1.35255, -9.398), (1.35255, -7.112), (1.7526, -7.112), (1.7526, 0), align=None)
    revolve(axis=Axis((-196.85, 50.8, -3.175), (-1, 0, 0)), mode=Mode.SUBTRACT)

    # Fillet5
    fillet5_edges = [part.edges().sort_by_distance(p)[0] for p in [
        (118.579686171, -33.3375, -3.175),
        (116.141805402, 54.31992556, -3.175),
        (-116.141805402, 54.31992556, -3.175),
        (-118.579686171, -33.3375, -3.175),
    ]]
    fillet(fillet5_edges, radius=FILLET5_R)


solid = part.part
